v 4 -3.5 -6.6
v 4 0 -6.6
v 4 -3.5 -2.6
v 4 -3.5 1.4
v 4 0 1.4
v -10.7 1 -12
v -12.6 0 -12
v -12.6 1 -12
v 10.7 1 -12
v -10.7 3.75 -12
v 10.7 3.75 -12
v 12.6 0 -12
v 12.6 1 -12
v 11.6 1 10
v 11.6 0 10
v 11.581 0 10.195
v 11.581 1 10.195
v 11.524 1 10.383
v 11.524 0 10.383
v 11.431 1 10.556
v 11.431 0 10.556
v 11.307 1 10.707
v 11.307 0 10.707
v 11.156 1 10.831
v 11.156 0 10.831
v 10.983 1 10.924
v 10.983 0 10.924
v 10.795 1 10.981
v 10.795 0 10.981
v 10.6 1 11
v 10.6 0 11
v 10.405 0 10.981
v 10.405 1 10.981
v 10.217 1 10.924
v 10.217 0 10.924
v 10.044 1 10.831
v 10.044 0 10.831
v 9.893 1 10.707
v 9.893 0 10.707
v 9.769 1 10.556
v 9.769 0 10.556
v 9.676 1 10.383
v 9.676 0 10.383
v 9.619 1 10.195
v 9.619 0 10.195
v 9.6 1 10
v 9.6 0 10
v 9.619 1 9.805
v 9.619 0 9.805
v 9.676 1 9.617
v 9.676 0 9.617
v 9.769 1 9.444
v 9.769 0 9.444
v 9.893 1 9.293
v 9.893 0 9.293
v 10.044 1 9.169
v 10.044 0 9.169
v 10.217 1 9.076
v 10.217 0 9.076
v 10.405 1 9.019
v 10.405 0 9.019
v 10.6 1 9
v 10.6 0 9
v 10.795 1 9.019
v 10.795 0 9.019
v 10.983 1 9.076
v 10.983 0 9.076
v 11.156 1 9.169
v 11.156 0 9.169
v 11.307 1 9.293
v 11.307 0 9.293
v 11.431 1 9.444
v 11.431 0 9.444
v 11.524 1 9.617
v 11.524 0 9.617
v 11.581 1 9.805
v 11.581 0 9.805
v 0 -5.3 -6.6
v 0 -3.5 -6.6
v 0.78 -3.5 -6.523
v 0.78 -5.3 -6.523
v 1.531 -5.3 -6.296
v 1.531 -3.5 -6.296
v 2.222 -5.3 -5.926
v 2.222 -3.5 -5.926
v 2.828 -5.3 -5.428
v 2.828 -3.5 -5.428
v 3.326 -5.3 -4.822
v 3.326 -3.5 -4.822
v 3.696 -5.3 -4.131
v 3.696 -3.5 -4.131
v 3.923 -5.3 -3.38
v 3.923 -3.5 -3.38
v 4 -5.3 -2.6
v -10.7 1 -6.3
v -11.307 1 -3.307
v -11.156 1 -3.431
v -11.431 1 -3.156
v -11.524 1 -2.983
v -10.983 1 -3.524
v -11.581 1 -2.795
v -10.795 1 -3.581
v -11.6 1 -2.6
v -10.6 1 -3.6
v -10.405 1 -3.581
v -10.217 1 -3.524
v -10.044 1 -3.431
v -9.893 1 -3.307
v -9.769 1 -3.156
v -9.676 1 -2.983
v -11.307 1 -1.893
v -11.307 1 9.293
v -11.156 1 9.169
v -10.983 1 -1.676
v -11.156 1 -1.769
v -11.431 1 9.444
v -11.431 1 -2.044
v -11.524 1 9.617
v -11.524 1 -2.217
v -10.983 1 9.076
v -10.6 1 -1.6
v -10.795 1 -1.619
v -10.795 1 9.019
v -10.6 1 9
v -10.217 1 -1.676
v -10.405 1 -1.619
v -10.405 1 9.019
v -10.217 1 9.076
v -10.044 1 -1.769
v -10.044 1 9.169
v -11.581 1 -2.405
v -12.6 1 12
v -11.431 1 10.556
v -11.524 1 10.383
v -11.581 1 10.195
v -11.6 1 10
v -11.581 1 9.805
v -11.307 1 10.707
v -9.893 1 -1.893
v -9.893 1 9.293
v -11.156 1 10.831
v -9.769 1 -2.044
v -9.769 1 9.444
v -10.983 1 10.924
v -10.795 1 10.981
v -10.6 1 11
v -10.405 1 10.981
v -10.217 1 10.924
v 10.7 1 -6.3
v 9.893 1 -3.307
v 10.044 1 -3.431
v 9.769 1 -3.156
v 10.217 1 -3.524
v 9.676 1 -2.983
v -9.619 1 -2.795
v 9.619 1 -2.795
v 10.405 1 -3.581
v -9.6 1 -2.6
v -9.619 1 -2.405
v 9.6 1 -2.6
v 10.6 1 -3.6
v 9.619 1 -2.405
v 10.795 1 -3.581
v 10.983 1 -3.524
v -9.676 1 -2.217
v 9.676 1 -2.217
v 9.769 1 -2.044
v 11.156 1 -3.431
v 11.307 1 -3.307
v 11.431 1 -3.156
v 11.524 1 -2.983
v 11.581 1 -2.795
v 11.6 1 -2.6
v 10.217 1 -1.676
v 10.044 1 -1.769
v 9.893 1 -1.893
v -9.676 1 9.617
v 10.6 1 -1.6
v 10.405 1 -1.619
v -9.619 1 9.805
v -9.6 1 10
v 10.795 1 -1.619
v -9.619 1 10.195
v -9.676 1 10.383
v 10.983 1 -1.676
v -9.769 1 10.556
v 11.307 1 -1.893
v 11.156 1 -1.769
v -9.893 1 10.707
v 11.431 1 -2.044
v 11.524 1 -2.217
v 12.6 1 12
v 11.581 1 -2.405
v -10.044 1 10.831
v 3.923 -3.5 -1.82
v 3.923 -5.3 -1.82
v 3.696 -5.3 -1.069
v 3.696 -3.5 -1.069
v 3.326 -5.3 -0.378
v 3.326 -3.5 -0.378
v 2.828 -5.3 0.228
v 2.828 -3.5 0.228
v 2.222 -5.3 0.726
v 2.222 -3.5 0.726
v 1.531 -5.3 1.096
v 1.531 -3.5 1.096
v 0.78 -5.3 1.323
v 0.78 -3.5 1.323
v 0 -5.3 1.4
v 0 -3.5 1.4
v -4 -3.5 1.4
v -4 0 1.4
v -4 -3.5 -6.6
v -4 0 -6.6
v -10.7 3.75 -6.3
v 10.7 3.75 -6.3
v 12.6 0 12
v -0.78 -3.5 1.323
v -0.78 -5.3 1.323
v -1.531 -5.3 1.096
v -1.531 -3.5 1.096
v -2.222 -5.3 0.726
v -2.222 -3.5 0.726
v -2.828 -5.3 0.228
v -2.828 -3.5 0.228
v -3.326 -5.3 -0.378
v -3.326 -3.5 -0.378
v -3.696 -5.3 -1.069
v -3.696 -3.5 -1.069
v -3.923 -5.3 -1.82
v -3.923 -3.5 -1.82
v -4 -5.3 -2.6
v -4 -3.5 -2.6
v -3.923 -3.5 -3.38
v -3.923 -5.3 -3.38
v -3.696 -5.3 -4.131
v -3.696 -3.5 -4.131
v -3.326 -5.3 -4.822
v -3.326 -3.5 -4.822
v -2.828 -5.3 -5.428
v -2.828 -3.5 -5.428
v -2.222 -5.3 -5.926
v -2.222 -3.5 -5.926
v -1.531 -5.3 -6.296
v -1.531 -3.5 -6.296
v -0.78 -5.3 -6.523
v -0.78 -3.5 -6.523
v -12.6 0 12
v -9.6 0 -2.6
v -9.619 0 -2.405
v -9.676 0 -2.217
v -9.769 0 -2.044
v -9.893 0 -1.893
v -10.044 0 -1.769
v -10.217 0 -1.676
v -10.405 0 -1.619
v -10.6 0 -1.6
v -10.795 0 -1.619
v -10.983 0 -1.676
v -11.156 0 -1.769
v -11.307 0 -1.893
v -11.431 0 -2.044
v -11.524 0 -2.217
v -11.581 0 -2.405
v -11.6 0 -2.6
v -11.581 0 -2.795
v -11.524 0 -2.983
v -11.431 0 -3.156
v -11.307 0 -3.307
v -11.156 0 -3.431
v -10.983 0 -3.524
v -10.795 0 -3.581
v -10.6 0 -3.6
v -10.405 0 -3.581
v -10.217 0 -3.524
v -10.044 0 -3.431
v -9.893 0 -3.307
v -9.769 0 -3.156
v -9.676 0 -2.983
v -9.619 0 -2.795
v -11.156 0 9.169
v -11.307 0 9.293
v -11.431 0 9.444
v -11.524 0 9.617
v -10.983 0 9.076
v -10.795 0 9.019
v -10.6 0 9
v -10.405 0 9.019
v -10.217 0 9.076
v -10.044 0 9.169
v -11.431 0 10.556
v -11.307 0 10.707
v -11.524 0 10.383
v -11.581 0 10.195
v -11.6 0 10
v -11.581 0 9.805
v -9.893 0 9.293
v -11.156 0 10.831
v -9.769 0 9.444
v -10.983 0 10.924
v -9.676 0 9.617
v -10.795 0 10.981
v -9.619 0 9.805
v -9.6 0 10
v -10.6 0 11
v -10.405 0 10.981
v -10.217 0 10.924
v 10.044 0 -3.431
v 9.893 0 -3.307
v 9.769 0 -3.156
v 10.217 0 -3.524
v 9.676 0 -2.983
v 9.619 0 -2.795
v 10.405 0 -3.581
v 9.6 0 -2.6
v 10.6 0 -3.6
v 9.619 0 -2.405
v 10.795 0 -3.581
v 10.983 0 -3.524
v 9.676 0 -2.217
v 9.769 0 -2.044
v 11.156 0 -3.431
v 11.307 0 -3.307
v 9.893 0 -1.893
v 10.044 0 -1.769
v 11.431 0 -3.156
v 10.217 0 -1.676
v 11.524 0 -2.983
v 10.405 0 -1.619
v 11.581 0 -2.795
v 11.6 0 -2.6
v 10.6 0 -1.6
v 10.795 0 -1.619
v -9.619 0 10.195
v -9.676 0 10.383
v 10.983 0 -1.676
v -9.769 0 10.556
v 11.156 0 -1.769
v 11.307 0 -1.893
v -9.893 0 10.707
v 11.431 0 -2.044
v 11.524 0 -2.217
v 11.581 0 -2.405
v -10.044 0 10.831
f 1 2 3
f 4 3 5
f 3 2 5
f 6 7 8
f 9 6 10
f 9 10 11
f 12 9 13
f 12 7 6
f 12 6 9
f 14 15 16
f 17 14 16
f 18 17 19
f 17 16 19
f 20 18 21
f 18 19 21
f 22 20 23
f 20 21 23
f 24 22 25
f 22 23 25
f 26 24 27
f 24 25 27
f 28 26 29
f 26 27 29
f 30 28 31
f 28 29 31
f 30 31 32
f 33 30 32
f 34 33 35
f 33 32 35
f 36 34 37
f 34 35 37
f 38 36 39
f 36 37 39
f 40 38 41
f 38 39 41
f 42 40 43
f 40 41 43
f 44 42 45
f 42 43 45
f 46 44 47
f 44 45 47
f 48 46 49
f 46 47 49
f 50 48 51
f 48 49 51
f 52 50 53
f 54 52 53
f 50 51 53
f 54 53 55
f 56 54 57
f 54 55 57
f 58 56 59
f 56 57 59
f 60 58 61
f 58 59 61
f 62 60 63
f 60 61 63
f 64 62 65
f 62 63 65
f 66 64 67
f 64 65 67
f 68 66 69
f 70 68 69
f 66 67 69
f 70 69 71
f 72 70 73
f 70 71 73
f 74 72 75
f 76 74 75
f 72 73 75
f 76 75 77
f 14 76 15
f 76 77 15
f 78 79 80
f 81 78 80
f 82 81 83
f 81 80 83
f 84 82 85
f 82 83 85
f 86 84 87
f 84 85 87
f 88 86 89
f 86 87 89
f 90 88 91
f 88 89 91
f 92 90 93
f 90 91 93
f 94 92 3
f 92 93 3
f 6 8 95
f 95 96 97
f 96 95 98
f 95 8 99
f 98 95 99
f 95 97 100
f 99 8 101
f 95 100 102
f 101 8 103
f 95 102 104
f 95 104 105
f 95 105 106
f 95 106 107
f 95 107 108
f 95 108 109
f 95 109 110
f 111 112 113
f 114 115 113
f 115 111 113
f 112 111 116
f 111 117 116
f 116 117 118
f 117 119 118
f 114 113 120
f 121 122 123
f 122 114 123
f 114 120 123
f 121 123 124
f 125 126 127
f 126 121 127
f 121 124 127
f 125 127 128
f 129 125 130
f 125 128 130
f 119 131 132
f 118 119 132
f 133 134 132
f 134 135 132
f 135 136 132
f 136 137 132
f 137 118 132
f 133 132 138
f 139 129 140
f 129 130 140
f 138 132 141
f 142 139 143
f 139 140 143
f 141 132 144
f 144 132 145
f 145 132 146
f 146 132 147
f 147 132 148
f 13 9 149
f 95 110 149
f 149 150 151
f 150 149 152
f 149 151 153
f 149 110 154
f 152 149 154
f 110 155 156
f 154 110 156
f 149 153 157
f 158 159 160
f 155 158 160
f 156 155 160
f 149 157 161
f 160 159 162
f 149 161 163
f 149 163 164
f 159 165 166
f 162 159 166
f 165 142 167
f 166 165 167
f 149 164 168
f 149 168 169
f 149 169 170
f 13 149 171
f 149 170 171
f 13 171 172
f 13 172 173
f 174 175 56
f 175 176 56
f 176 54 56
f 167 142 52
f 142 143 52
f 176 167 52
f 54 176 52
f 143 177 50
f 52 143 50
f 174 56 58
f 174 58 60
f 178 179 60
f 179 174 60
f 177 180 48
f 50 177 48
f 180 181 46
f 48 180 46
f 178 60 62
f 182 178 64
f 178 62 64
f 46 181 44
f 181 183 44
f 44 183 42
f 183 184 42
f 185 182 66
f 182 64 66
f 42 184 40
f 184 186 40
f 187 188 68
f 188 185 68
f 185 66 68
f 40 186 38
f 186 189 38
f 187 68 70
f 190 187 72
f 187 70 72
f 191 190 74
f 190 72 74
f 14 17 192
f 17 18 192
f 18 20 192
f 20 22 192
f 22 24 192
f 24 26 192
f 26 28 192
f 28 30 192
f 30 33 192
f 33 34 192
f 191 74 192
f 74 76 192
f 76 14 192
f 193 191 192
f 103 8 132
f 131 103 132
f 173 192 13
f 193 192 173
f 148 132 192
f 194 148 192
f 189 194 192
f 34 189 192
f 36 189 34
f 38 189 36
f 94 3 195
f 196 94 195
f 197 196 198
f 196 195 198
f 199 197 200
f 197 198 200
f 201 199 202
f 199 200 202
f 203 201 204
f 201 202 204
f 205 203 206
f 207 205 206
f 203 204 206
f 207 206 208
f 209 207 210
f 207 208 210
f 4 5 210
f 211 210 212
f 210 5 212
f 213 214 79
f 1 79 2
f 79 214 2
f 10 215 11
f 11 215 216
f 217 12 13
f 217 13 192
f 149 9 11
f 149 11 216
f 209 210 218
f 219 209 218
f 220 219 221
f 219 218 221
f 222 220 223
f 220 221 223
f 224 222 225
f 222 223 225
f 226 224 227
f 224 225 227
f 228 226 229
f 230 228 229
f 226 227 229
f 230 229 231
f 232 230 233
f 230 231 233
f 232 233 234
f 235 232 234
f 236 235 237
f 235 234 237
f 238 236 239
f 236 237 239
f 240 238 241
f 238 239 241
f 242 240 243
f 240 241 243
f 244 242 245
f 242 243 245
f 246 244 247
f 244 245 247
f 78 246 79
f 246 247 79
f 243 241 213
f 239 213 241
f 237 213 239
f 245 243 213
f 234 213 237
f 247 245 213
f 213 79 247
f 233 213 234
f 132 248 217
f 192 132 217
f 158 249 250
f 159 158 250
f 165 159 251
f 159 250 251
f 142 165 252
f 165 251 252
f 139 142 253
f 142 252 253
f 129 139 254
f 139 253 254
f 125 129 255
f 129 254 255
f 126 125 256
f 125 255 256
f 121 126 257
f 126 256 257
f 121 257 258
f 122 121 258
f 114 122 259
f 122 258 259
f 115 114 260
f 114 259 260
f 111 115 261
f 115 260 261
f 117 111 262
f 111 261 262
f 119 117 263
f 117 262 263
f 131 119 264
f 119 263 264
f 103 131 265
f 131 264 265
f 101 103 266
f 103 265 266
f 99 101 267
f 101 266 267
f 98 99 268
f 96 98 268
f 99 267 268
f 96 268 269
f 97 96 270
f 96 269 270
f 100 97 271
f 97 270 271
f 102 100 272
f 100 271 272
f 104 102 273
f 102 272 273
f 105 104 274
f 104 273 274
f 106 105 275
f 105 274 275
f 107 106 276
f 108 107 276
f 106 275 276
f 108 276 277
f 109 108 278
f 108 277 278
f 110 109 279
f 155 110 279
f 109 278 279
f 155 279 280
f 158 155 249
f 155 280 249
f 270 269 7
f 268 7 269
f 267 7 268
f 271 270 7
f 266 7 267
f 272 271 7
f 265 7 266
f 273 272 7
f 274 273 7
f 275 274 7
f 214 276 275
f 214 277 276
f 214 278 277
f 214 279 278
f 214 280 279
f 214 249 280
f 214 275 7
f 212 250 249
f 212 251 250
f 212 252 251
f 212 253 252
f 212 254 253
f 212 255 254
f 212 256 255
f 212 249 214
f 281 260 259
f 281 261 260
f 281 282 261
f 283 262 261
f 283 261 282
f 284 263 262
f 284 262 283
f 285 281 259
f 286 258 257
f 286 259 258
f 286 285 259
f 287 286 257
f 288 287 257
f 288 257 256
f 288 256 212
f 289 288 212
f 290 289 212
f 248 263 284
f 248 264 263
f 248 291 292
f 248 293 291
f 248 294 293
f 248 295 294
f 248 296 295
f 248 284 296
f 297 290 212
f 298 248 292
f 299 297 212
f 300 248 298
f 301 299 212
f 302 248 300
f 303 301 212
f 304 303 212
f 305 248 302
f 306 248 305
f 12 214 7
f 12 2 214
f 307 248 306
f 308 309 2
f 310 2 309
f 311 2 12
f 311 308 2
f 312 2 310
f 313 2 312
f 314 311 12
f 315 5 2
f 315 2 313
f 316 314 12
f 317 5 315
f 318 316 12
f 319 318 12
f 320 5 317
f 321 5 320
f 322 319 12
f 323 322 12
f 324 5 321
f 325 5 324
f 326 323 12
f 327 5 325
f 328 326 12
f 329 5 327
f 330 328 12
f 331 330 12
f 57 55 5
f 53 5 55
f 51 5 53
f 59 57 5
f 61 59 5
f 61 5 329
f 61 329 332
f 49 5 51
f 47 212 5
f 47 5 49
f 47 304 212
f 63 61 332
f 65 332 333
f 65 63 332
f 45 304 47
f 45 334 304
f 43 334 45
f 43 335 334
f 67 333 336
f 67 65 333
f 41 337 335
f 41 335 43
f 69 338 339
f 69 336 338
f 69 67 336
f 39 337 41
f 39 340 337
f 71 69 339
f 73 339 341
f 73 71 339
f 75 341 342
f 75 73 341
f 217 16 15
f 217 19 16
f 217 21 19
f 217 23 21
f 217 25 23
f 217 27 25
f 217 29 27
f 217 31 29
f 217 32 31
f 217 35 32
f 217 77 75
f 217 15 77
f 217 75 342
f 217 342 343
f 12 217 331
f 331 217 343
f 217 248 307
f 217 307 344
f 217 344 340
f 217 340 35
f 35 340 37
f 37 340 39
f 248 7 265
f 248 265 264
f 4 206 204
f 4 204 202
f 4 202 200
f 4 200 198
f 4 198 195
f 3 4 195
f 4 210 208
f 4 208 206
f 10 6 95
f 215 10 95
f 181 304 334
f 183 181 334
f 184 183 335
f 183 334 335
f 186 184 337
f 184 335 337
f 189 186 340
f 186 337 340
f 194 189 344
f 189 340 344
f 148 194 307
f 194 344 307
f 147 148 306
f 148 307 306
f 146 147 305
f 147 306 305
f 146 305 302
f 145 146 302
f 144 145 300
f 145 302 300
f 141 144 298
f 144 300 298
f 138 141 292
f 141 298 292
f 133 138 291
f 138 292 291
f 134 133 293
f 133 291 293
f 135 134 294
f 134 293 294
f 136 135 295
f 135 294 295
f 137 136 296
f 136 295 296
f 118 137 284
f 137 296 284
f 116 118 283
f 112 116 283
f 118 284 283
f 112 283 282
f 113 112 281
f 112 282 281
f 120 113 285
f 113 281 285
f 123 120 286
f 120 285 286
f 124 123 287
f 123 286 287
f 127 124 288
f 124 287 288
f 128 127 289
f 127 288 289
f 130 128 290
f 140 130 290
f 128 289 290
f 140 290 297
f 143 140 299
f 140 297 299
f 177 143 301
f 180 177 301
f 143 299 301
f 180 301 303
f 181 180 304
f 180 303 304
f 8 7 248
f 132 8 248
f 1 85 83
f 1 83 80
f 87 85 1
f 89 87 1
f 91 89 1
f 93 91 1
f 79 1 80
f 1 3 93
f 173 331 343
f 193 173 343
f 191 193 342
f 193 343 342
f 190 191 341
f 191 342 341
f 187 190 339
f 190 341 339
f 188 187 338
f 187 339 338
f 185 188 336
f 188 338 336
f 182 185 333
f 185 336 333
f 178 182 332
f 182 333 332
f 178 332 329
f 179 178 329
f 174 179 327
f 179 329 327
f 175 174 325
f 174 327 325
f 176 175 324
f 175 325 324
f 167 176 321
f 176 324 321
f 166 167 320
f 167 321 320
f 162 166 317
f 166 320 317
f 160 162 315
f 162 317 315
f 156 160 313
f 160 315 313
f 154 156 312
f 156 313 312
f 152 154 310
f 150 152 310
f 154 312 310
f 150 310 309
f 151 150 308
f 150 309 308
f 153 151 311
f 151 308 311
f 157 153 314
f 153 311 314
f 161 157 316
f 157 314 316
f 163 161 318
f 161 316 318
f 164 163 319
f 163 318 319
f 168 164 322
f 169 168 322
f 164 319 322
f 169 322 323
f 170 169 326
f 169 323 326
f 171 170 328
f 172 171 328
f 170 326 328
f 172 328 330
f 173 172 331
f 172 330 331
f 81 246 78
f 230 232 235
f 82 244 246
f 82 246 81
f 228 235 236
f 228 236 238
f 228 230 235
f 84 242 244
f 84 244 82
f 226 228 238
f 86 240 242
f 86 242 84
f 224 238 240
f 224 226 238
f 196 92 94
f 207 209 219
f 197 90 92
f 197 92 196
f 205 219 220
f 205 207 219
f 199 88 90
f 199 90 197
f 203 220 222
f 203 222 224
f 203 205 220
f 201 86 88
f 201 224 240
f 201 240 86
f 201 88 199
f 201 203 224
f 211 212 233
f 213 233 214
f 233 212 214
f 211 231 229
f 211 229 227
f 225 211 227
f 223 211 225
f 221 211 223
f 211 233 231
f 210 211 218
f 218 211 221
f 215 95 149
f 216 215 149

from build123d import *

# Parameters (mm, degrees)
F0_W     = 25.2
F0_H     = 24
F0_R     = 1
F3_DEPTH = 1
F4_DEPTH = 3.5
F5_DEPTH = 5.3
F2_W     = 21.4
F2_H     = 5.7
F6_DEPTH = 3.75


with BuildPart() as f3:
    # F0 (on Front) → F3 (new body)
    with BuildSketch(Plane.XZ):
        Rectangle(F0_W, F0_H)
        with Locations((-10.6, -2.6)):
            Circle(F0_R, mode=Mode.SUBTRACT)
        with Locations((10.6, -2.6)):
            Circle(F0_R, mode=Mode.SUBTRACT)
        with Locations((-10.6, 10)):
            Circle(F0_R, mode=Mode.SUBTRACT)
        with Locations((10.6, 10)):
            Circle(F0_R, mode=Mode.SUBTRACT)
    extrude(amount=-F3_DEPTH)

    # F1 (on face) → F4 (join)
    with BuildSketch(Plane.XZ):
        with BuildLine():
            Line((0, -6.6), (4, -6.6))
            Line((4, -6.6), (4, -2.6))
            ThreePointArc((4, -2.6), (2.828427, -5.428427), (0, -6.6))
        make_face()
        with BuildLine():
            Line((-4, -6.6), (0, -6.6))
            ThreePointArc((0, -6.6), (-2.828427, -5.428427), (-4, -2.6))
            Line((-4, -2.6), (-4, -6.6))
        make_face()
        with BuildLine():
            ThreePointArc((0, 1.4), (2.828427, 0.228427), (4, -2.6))
            Line((4, -2.6), (4, 1.4))
            Line((4, 1.4), (0, 1.4))
        make_face()
        with BuildLine():
            Line((-4, 1.4), (-4, -2.6))
            ThreePointArc((-4, -2.6), (-2.828427, 0.228427), (0, 1.4))
            Line((0, 1.4), (-4, 1.4))
        make_face()
    extrude(amount=F4_DEPTH)

    # F1 (on face) → F5 (join)
    with BuildSketch(Plane.XZ):
        with BuildLine():
            ThreePointArc((-4, -2.6), (-2.828427, -5.428427), (0, -6.6))
            ThreePointArc((0, -6.6), (2.828427, -5.428427), (4, -2.6))
            ThreePointArc((4, -2.6), (2.828427, 0.228427), (0, 1.4))
            ThreePointArc((0, 1.4), (-2.828427, 0.228427), (-4, -2.6))
        make_face()
    extrude(amount=F5_DEPTH)

    # F2 (on face) → F6 (join)
    with BuildSketch(Plane.XZ):
        with Locations((0, -9.15)):
            Rectangle(F2_W, F2_H)
    extrude(amount=-F6_DEPTH)


solid = f3.part
